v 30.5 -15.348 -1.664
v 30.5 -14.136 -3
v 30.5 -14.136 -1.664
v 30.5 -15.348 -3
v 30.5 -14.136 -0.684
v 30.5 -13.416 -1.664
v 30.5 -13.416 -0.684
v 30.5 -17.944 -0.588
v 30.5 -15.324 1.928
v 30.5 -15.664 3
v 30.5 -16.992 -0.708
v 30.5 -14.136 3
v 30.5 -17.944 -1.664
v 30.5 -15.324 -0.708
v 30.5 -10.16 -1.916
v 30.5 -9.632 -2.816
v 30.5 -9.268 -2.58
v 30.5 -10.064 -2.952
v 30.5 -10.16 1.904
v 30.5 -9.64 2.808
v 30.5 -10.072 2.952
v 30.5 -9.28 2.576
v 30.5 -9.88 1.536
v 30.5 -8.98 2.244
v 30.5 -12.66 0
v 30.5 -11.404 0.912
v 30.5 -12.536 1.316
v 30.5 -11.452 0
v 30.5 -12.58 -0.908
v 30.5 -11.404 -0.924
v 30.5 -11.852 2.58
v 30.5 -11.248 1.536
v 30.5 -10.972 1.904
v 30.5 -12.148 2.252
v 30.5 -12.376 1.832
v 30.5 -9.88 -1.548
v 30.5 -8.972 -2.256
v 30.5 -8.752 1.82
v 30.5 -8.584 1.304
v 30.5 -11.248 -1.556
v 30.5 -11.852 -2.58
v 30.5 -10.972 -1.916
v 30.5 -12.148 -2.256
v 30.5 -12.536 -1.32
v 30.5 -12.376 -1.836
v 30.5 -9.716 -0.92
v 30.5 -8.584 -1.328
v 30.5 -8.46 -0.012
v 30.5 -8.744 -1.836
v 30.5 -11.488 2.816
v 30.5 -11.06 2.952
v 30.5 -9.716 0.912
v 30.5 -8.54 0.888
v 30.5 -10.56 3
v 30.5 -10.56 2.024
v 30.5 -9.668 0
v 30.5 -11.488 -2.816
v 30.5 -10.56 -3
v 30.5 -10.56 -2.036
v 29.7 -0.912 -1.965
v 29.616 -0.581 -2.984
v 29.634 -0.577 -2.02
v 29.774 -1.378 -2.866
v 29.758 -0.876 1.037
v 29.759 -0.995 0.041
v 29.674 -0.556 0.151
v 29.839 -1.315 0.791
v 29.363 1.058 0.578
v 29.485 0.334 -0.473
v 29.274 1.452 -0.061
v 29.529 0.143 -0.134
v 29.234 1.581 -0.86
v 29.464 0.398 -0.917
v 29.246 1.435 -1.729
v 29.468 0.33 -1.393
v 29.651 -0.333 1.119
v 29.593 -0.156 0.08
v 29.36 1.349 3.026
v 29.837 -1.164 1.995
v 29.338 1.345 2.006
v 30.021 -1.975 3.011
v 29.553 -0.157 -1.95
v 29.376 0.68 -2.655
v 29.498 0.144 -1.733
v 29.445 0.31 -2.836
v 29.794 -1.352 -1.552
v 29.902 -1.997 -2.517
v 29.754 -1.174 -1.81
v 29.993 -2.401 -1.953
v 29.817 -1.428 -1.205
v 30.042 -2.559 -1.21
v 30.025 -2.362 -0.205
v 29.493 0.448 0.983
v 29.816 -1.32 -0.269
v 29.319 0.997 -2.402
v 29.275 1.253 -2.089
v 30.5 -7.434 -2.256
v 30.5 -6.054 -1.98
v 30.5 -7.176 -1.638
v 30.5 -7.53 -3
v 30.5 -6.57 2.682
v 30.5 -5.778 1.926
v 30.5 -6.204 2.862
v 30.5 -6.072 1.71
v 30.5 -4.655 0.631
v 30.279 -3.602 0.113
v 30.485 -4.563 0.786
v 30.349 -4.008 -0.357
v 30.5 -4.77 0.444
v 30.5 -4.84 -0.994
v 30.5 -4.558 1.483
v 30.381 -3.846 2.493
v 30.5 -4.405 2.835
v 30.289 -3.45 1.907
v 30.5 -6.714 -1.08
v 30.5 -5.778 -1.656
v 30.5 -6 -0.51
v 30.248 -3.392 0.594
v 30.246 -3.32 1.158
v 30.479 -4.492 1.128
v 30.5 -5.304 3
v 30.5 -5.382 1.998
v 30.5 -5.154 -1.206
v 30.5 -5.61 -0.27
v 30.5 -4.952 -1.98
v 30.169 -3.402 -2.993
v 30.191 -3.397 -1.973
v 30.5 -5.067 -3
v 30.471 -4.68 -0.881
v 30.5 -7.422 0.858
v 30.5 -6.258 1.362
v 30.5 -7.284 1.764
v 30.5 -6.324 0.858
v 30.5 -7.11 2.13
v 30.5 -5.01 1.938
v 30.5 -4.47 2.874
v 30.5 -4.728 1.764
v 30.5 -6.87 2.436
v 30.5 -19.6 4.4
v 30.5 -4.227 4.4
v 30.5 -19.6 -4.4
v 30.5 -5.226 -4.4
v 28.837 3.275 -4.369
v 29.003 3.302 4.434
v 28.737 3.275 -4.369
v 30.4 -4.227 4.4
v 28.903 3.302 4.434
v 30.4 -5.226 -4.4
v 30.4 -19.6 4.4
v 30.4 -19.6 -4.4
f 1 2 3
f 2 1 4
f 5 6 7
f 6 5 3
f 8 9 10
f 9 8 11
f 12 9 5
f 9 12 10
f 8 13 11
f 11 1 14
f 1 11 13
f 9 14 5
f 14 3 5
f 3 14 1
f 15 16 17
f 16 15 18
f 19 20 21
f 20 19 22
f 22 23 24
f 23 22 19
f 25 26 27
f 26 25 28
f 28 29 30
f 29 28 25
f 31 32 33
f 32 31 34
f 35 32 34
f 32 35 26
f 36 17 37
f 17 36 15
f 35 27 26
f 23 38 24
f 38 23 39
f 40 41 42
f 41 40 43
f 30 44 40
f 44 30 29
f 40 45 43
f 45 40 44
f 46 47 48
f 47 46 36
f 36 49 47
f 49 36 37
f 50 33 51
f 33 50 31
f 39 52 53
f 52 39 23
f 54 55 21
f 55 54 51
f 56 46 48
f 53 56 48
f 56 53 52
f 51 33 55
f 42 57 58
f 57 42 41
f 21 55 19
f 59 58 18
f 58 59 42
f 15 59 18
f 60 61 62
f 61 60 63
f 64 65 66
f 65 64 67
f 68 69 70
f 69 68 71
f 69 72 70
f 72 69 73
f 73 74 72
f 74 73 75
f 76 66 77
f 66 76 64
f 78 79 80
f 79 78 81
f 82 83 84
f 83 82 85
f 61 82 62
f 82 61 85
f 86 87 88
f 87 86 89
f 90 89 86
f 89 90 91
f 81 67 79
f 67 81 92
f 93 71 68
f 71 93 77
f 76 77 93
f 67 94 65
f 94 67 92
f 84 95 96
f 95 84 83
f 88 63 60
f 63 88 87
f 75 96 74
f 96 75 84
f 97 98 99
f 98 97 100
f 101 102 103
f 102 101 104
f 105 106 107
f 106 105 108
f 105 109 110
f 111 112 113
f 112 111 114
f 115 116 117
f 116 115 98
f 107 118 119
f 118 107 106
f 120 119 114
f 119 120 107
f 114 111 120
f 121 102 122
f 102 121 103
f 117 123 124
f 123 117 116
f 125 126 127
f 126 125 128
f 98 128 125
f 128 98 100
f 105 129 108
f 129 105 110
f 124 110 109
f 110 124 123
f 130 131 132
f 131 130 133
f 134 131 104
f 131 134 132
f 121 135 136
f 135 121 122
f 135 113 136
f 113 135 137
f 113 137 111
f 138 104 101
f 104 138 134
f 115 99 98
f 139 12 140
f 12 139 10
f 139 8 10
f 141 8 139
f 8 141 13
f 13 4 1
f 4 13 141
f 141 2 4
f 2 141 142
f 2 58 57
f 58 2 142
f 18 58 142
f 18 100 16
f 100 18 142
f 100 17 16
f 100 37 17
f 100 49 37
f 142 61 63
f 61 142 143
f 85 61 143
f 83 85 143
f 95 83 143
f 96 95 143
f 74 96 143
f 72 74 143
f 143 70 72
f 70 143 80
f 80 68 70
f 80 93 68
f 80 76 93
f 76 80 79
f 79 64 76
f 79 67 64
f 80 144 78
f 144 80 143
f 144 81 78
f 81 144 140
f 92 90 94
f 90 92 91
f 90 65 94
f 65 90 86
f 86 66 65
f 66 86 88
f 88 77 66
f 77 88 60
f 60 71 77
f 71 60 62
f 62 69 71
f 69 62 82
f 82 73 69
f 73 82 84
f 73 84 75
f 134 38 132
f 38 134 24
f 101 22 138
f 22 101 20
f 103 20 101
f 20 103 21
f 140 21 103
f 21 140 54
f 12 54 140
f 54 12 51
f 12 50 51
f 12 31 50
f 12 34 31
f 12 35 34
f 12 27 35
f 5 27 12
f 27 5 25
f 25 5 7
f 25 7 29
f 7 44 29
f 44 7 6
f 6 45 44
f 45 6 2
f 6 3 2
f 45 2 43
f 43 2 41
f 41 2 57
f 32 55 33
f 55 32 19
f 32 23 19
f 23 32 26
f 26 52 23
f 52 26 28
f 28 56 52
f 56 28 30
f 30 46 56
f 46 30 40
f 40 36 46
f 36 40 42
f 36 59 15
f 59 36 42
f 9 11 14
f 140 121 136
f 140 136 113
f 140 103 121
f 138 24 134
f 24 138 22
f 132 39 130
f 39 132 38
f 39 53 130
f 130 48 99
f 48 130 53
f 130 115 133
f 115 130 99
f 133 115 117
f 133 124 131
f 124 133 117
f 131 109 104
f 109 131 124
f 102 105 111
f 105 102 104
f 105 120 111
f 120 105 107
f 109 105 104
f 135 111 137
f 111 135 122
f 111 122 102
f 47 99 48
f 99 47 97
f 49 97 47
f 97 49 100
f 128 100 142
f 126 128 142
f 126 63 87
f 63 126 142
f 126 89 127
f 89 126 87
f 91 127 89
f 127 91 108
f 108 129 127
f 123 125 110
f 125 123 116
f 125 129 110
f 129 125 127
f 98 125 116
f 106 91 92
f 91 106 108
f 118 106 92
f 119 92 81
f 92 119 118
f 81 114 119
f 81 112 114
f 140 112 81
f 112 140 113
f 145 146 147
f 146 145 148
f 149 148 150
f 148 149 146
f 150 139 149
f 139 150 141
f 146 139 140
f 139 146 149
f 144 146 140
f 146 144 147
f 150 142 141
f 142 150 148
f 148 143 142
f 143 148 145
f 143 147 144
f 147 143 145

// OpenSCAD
use <../lib.scad>
function ldraw_lib__194305fc01() = [
// 0 Sticker  1.1 x  2.9 with White "4025" on Transparent Background (Formed for Boat Stern Left Side)
// 0 Name: 194305fc01.dat
// 0 Author: Takeshi Takahashi [RainbowDolphin]
// 0 !LDRAW_ORG Part UPDATE 2022-06
// 0 !LICENSE Licensed under CC BY 4.0 : see CAreadme.txt
// 
// 0 BFC CERTIFY CCW
  [0,"BFC","CERTIFY"],
  [0,"BFC","CCW"],
// 
// 0 !KEYWORDS Bricklink 4025stk01, Brickowl 866936, Fire boat, Rebrickable 194305
// 0 !KEYWORDS Set 4025
// 
// 0 !HISTORY 2022-12-20 [PTadmin] Official Update 2022-06
// 
// 
// 0 BFC NOCLIP
  [0,"BFC","NOCLIP"],
// 4 15 76.25 7.5 -38.37 76.25 7.5 -35.34 76.25 4.16 -35.34 76.25 4.16 -38.37
  [4,15,76.25,7.5,-38.37,76.25,7.5,-35.34,76.25,4.16,-35.34,76.25,4.16,-38.37],
// 4 15 76.25 1.71 -35.34 76.25 4.16 -35.34 76.25 4.16 -33.54 76.25 1.71 -33.54
  [4,15,76.25,1.71,-35.34,76.25,4.16,-35.34,76.25,4.16,-33.54,76.25,1.71,-33.54],
// 4 15 76.25 1.77 -42.48 76.25 -4.82 -38.31 76.25 -7.5 -39.16 76.25 1.47 -44.86
  [4,15,76.25,1.77,-42.48,76.25,-4.82,-38.31,76.25,-7.5,-39.16,76.25,1.47,-44.86],
// 4 15 76.25 -7.5 -35.34 76.25 -7.5 -39.16 76.25 -4.82 -38.31 76.25 1.71 -35.34
  [4,15,76.25,-7.5,-35.34,76.25,-7.5,-39.16,76.25,-4.82,-38.31,76.25,1.71,-35.34],
// 3 15 76.25 1.47 -44.86 76.25 4.16 -44.86 76.25 1.77 -42.48
  [3,15,76.25,1.47,-44.86,76.25,4.16,-44.86,76.25,1.77,-42.48],
// 4 15 76.25 1.77 -38.31 76.25 1.77 -42.48 76.25 4.16 -44.86 76.25 4.16 -38.37
  [4,15,76.25,1.77,-38.31,76.25,1.77,-42.48,76.25,4.16,-44.86,76.25,4.16,-38.37],
// 3 15 76.25 -4.82 -38.31 76.25 1.77 -38.31 76.25 1.71 -35.34
  [3,15,76.25,-4.82,-38.31,76.25,1.77,-38.31,76.25,1.71,-35.34],
// 4 15 76.25 4.16 -38.37 76.25 4.16 -35.34 76.25 1.71 -35.34 76.25 1.77 -38.31
  [4,15,76.25,4.16,-38.37,76.25,4.16,-35.34,76.25,1.71,-35.34,76.25,1.77,-38.31],
// 4 15 76.25 6.45 -23.17 76.25 4.79 -25.4 76.25 7.38 -25.16 76.25 7.04 -24.08
  [4,15,76.25,6.45,-23.17,76.25,4.79,-25.4,76.25,7.38,-25.16,76.25,7.04,-24.08],
// 4 15 76.25 -7.38 -25.18 76.25 -4.76 -25.4 76.25 -6.44 -23.2 76.25 -7.02 -24.1
  [4,15,76.25,-7.38,-25.18,76.25,-4.76,-25.4,76.25,-6.44,-23.2,76.25,-7.02,-24.1],
// 4 15 76.25 -5.61 -22.45 76.25 -6.44 -23.2 76.25 -4.76 -25.4 76.25 -3.84 -24.7
  [4,15,76.25,-5.61,-22.45,76.25,-6.44,-23.2,76.25,-4.76,-25.4,76.25,-3.84,-24.7],
// 4 15 76.25 -3.29 -31.34 76.25 0 -31.65 76.25 0 -28.63 76.25 -2.28 -28.51
  [4,15,76.25,-3.29,-31.34,76.25,0,-31.65,76.25,0,-28.63,76.25,-2.28,-28.51],
// 4 15 76.25 0 -31.65 76.25 2.27 -31.45 76.25 2.31 -28.51 76.25 0 -28.63
  [4,15,76.25,0,-31.65,76.25,2.27,-31.45,76.25,2.31,-28.51,76.25,0,-28.63],
// 4 15 76.25 -4.76 -27.43 76.25 -6.45 -29.63 76.25 -5.63 -30.37 76.25 -3.84 -28.119
  [4,15,76.25,-4.76,-27.43,76.25,-6.45,-29.63,76.25,-5.63,-30.37,76.25,-3.84,-28.119],
// 4 15 76.25 -3.84 -28.119 76.25 -5.63 -30.37 76.25 -4.58 -30.94 76.25 -2.28 -28.51
  [4,15,76.25,-3.84,-28.119,76.25,-5.63,-30.37,76.25,-4.58,-30.94,76.25,-2.28,-28.51],
// 4 15 76.25 4.79 -25.4 76.25 6.45 -23.17 76.25 5.64 -22.43 76.25 3.87 -24.7
  [4,15,76.25,4.79,-25.4,76.25,6.45,-23.17,76.25,5.64,-22.43,76.25,3.87,-24.7],
// 3 15 76.25 -4.58 -30.94 76.25 -3.29 -31.34 76.25 -2.28 -28.51
  [3,15,76.25,-4.58,-30.94,76.25,-3.29,-31.34,76.25,-2.28,-28.51],
// 4 15 76.25 -3.26 -21.46 76.25 -4.55 -21.88 76.25 -5.61 -22.45 76.25 -3.84 -24.7
  [4,15,76.25,-3.26,-21.46,76.25,-4.55,-21.88,76.25,-5.61,-22.45,76.25,-3.84,-24.7],
// 4 15 76.25 4.79 -27.43 76.25 3.89 -28.119 76.25 5.64 -30.37 76.25 6.45 -29.63
  [4,15,76.25,4.79,-27.43,76.25,3.89,-28.119,76.25,5.64,-30.37,76.25,6.45,-29.63],
// 4 15 76.25 2.27 -31.45 76.25 3.3 -31.34 76.25 3.89 -28.119 76.25 2.31 -28.51
  [4,15,76.25,2.27,-31.45,76.25,3.3,-31.34,76.25,3.89,-28.119,76.25,2.31,-28.51],
// 4 15 76.25 3.3 -31.34 76.25 4.59 -30.94 76.25 5.64 -30.37 76.25 3.89 -28.119
  [4,15,76.25,3.3,-31.34,76.25,4.59,-30.94,76.25,5.64,-30.37,76.25,3.89,-28.119],
// 4 15 76.25 .03 -21.15 76.25 2.3 -24.29 76.25 3.87 -24.7 76.25 3.32 -21.46
  [4,15,76.25,.03,-21.15,76.25,2.3,-24.29,76.25,3.87,-24.7,76.25,3.32,-21.46],
// 4 15 76.25 5.64 -22.43 76.25 4.59 -21.86 76.25 3.32 -21.46 76.25 3.87 -24.7
  [4,15,76.25,5.64,-22.43,76.25,4.59,-21.86,76.25,3.32,-21.46,76.25,3.87,-24.7],
// 4 15 76.25 -6.45 -29.63 76.25 -4.76 -27.43 76.25 -7.38 -27.65 76.25 -7.04 -28.72
  [4,15,76.25,-6.45,-29.63,76.25,-4.76,-27.43,76.25,-7.38,-27.65,76.25,-7.04,-28.72],
// 4 15 76.25 -3.84 -24.7 76.25 -2.28 -24.29 76.25 -2.22 -21.35 76.25 -3.26 -21.46
  [4,15,76.25,-3.84,-24.7,76.25,-2.28,-24.29,76.25,-2.22,-21.35,76.25,-3.26,-21.46],
// 4 15 76.25 -7.38 -25.18 76.25 -7.5 -26.4 76.25 -7.38 -27.65 76.25 -5.06 -26.4
  [4,15,76.25,-7.38,-25.18,76.25,-7.5,-26.4,76.25,-7.38,-27.65,76.25,-5.06,-26.4],
// 3 15 76.25 0 -24.17 76.25 2.3 -24.29 76.25 .03 -21.15
  [3,15,76.25,0,-24.17,76.25,2.3,-24.29,76.25,.03,-21.15],
// 4 15 76.25 -2.28 -24.29 76.25 0 -24.17 76.25 .03 -21.15 76.25 -2.22 -21.35
  [4,15,76.25,-2.28,-24.29,76.25,0,-24.17,76.25,.03,-21.15,76.25,-2.22,-21.35],
// 3 15 76.25 -7.38 -27.65 76.25 -4.76 -27.43 76.25 -5.06 -26.4
  [3,15,76.25,-7.38,-27.65,76.25,-4.76,-27.43,76.25,-5.06,-26.4],
// 4 15 76.25 6.45 -29.63 76.25 7.04 -28.72 76.25 7.5 -26.4 76.25 4.79 -27.43
  [4,15,76.25,6.45,-29.63,76.25,7.04,-28.72,76.25,7.5,-26.4,76.25,4.79,-27.43],
// 3 15 76.25 -7.38 -25.18 76.25 -5.06 -26.4 76.25 -4.76 -25.4
  [3,15,76.25,-7.38,-25.18,76.25,-5.06,-26.4,76.25,-4.76,-25.4],
// 4 15 76.25 4.79 -27.43 76.25 7.5 -26.4 76.25 7.38 -25.16 76.25 5.09 -26.4
  [4,15,76.25,4.79,-27.43,76.25,7.5,-26.4,76.25,7.38,-25.16,76.25,5.09,-26.4],
// 3 15 76.25 4.79 -25.4 76.25 5.09 -26.4 76.25 7.38 -25.16
  [3,15,76.25,4.79,-25.4,76.25,5.09,-26.4,76.25,7.38,-25.16],
// 4 15 74.4358 7.1662 -3.4444 74.041 7.4589 -1.4515 74.0842 5.0497 -1.4431 74.2504 4.9128 -2.2806
  [4,15,74.4358,7.1662,-3.4444,74.041,7.4589,-1.4515,74.0842,5.0497,-1.4431,74.2504,4.9128,-2.2806],
// 4 15 74.5986 -1.9773 -3.2884 74.3972 -.1018 -2.4885 74.1851 -.3766 -1.3906 74.3939 -2.5919 -2.1891
  [4,15,74.5986,-1.9773,-3.2884,74.3972,-.1018,-2.4885,74.1851,-.3766,-1.3906,74.3939,-2.5919,-2.1891],
// 4 15 73.8215 .3352 .3571 73.7114 1.1827 .8341 73.1842 .1529 3.6311 73.4068 -1.4442 2.6446
  [4,15,73.8215,.3352,.3571,73.7114,1.1827,.8341,73.1842,.1529,3.6311,73.4068,-1.4442,2.6446],
// 4 15 73.1842 .1529 3.6311 73.7114 1.1827 .8341 73.6595 2.2918 .994 73.0843 2.1511 3.9516
  [4,15,73.1842,.1529,3.6311,73.7114,1.1827,.8341,73.6595,2.2918,.994,73.0843,2.1511,3.9516],
// 4 15 73.6701 3.482 .826 73.115 4.3216 3.5876 73.0843 2.1511 3.9516 73.6595 2.2918 .994
  [4,15,73.6701,3.482,.826,73.115,4.3216,3.5876,73.0843,2.1511,3.9516,73.6595,2.2918,.994],
// 4 15 74.3939 -2.5919 -2.1891 74.1851 -.3766 -1.3906 73.9823 -.2012 -.391 74.1287 -2.7979 -.8319
  [4,15,74.3939,-2.5919,-2.1891,74.1851,-.3766,-1.3906,73.9823,-.2012,-.391,74.1287,-2.7979,-.8319],
// 4 15 75.0521 -7.5271 -4.9382 74.5913 -4.9875 -2.9099 73.3447 -5.0156 3.3622 73.4 -7.5644 3.3732
  [4,15,75.0521,-7.5271,-4.9382,74.5913,-4.9875,-2.9099,73.3447,-5.0156,3.3622,73.4,-7.5644,3.3732],
// 4 15 73.4404 6.6377 1.7012 73.7452 4.3334 .3607 73.8822 4.8759 -.3925 73.613 7.0909 .7749
  [4,15,73.4404,6.6377,1.7012,73.7452,4.3334,.3607,73.8822,4.8759,-.3925,73.613,7.0909,.7749],
// 4 15 74.0842 5.0497 -1.4431 74.041 7.4589 -1.4515 73.613 7.0909 .7749 73.8822 4.8759 -.3925
  [4,15,74.0842,5.0497,-1.4431,74.041,7.4589,-1.4515,73.613,7.0909,.7749,73.8822,4.8759,-.3925],
// 4 15 74.3853 4.5253 -2.9343 74.4848 3.8801 -3.381 74.9834 4.8814 -6.0019 74.7544 6.2922 -4.9922
  [4,15,74.3853,4.5253,-2.9343,74.4848,3.8801,-3.381,74.9834,4.8814,-6.0019,74.7544,6.2922,-4.9922],
// 4 15 75.1041 3.0241 -6.3979 74.9834 4.8814 -6.0019 74.4848 3.8801 -3.381 74.5419 3.0114 -3.5697
  [4,15,75.1041,3.0241,-6.3979,74.9834,4.8814,-6.0019,74.4848,3.8801,-3.381,74.5419,3.0114,-3.5697],
// 4 15 74.5913 -4.9875 -2.9099 75.0521 -7.5271 -4.9382 75.063 .5132 -5.9061 74.5986 -1.9773 -3.2884
  [4,15,74.5913,-4.9875,-2.9099,75.0521,-7.5271,-4.9382,75.063,.5132,-5.9061,74.5986,-1.9773,-3.2884],
// 4 15 73.4068 -1.4442 2.6446 73.7329 -2.4568 1.1194 73.9823 -.2012 -.391 73.8215 .3352 .3571
  [4,15,73.4068,-1.4442,2.6446,73.7329,-2.4568,1.1194,73.9823,-.2012,-.391,73.8215,.3352,.3571],
// 3 15 74.1287 -2.7979 -.8319 73.9823 -.2012 -.391 73.7329 -2.4568 1.1194
  [3,15,74.1287,-2.7979,-.8319,73.9823,-.2012,-.391,73.7329,-2.4568,1.1194],
// 4 15 75.063 .5132 -5.9061 74.5411 .6714 -3.2998 74.3972 -.1018 -2.4885 74.5986 -1.9773 -3.2884
  [4,15,75.063,.5132,-5.9061,74.5411,.6714,-3.2998,74.3972,-.1018,-2.4885,74.5986,-1.9773,-3.2884],
// 4 15 73.1873 5.223 3.1317 73.7452 4.3334 .3607 73.4404 6.6377 1.7012 73.2975 6.005 2.4932
  [4,15,73.1873,5.223,3.1317,73.7452,4.3334,.3607,73.4404,6.6377,1.7012,73.2975,6.005,2.4932],
// 4 15 74.7544 6.2922 -4.9922 74.4358 7.1662 -3.4444 74.2504 4.9128 -2.2806 74.3853 4.5253 -2.9343
  [4,15,74.7544,6.2922,-4.9922,74.4358,7.1662,-3.4444,74.2504,4.9128,-2.2806,74.3853,4.5253,-2.9343],
// 4 15 73.115 4.3216 3.5876 73.6701 3.482 .826 73.7452 4.3334 .3607 73.1873 5.223 3.1317
  [4,15,73.115,4.3216,3.5876,73.6701,3.482,.826,73.7452,4.3334,.3607,73.1873,5.223,3.1317],
// 4 15 76.25 4.095 -17.94 76.25 5.64 -18.585 76.25 7.5 -18.825 76.25 4.95 -15.135
  [4,15,76.25,4.095,-17.94,76.25,5.64,-18.585,76.25,7.5,-18.825,76.25,4.95,-15.135],
// 4 15 76.25 -7.155 -15.51 76.25 -6.705 -16.425 76.25 -4.275 -15.18 76.25 -4.815 -14.445
  [4,15,76.25,-7.155,-15.51,76.25,-6.705,-16.425,76.25,-4.275,-15.18,76.25,-4.815,-14.445],
// 4 15 76.213 -1.9658 -11.4074 76.25 -1.578 -11.6376 75.8726 .8915 -10.0201 75.6972 -.2825 -9.0049
  [4,15,76.213,-1.9658,-11.4074,76.25,-1.578,-11.6376,75.8726,.8915,-10.0201,75.6972,-.2825,-9.0049],
// 3 15 76.25 -1.578 -11.6376 76.25 -1.11 -11.925 76.25 2.4844 -12.0989
  [3,15,76.25,-1.578,-11.6376,76.25,-1.11,-11.925,76.25,2.4844,-12.0989],
// 4 15 75.9527 -6.2317 -9.6141 76.25 -7.0884 -11.0119 76.25 -3.7079 -11.3958 75.7229 -4.7669 -8.6248
  [4,15,75.9527,-6.2317,-9.6141,76.25,-7.0884,-11.0119,76.25,-3.7079,-11.3958,75.7229,-4.7669,-8.6248],
// 4 15 76.25 1.275 -15 76.25 2.7 -16.785 76.25 4.95 -15.135 76.25 4.14 -14.445
  [4,15,76.25,1.275,-15,76.25,2.7,-16.785,76.25,4.95,-15.135,76.25,4.14,-14.445],
// 4 15 76.213 -1.9658 -11.4074 75.6972 -.2825 -9.0049 75.62 -1.4842 -8.4803 75.6162 -2.8943 -8.301
  [4,15,76.213,-1.9658,-11.4074,75.6972,-.2825,-9.0049,75.62,-1.4842,-8.4803,75.6162,-2.8943,-8.301],
// 4 15 76.1971 -2.8212 -11.2305 76.213 -1.9658 -11.4074 75.6162 -2.8943 -8.301 75.7229 -4.7669 -8.6248
  [4,15,76.1971,-2.8212,-11.2305,76.213,-1.9658,-11.4074,75.6162,-2.8943,-8.301,75.7229,-4.7669,-8.6248],
// 3 15 75.7229 -4.7669 -8.6248 76.25 -3.7079 -11.3958 76.1971 -2.8212 -11.2305
  [3,15,75.7229,-4.7669,-8.6248,76.25,-3.7079,-11.3958,76.1971,-2.8212,-11.2305],
// 4 15 76.25 -4.995 -13.455 76.25 -7.5 -13.26 76.25 -7.155 -15.51 76.25 -4.815 -14.445
  [4,15,76.25,-4.995,-13.455,76.25,-7.5,-13.26,76.25,-7.155,-15.51,76.25,-4.815,-14.445],
// 4 15 76.25 .675 -14.025 76.25 1.275 -15 76.25 4.14 -14.445 76.25 3.015 -12.885
  [4,15,76.25,.675,-14.025,76.25,1.275,-15,76.25,4.14,-14.445,76.25,3.015,-12.885],
// 4 15 75.4224 7.4813 -8.5046 75.4777 4.9326 -8.4936 76.25 4.95 -12.3789 76.25 7.5 -12.6684
  [4,15,75.4224,7.4813,-8.5046,75.4777,4.9326,-8.4936,76.25,4.95,-12.3789,76.25,7.5,-12.6684],
// 4 15 76.25 4.95 -15.135 76.25 7.5 -18.825 76.25 7.5 -12.6684 76.25 4.95 -12.3789
  [4,15,76.25,4.95,-15.135,76.25,7.5,-18.825,76.25,7.5,-12.6684,76.25,4.95,-12.3789],
// 4 15 75.8726 .8915 -10.0201 76.25 -1.578 -11.6376 76.25 2.4844 -12.0989 76.1769 2.2033 -11.6995
  [4,15,75.8726,.8915,-10.0201,76.25,-1.578,-11.6376,76.25,2.4844,-12.0989,76.1769,2.2033,-11.6995],
// 4 15 76.25 -1.11 -11.925 76.25 .675 -14.025 76.25 3.015 -12.885 76.25 2.4844 -12.0989
  [4,15,76.25,-1.11,-11.925,76.25,.675,-14.025,76.25,3.015,-12.885,76.25,2.4844,-12.0989],
// 4 15 76.25 -4.41 -18.21 76.25 -2.145 -18.555 76.25 -2.145 -15.81 76.25 -3.405 -15.645
  [4,15,76.25,-4.41,-18.21,76.25,-2.145,-18.555,76.25,-2.145,-15.81,76.25,-3.405,-15.645],
// 4 15 76.25 -4.275 -15.18 76.25 -5.325 -17.775 76.25 -4.41 -18.21 76.25 -3.405 -15.645
  [4,15,76.25,-4.275,-15.18,76.25,-5.325,-17.775,76.25,-4.41,-18.21,76.25,-3.405,-15.645],
// 4 15 76.25 -4.995 -13.455 76.25 -4.845 -12.525 76.25 -7.185 -11.175 76.25 -7.5 -13.26
  [4,15,76.25,-4.995,-13.455,76.25,-4.845,-12.525,76.25,-7.185,-11.175,76.25,-7.5,-13.26],
// 4 15 76.25 -7.185 -11.175 76.25 -4.845 -12.525 76.25 -4.41 -11.82 76.25 -7.0884 -11.0119
  [4,15,76.25,-7.185,-11.175,76.25,-4.845,-12.525,76.25,-4.41,-11.82,76.25,-7.0884,-11.0119],
// 3 15 76.25 -7.0884 -11.0119 76.25 -4.41 -11.82 76.25 -3.7079 -11.3958
  [3,15,76.25,-7.0884,-11.0119,76.25,-4.41,-11.82,76.25,-3.7079,-11.3958],
// 4 15 76.25 -5.325 -17.775 76.25 -4.275 -15.18 76.25 -6.705 -16.425 76.25 -6.09 -17.175
  [4,15,76.25,-5.325,-17.775,76.25,-4.275,-15.18,76.25,-6.705,-16.425,76.25,-6.09,-17.175],
// 3 15 76.25 2.7 -16.785 76.25 4.095 -17.94 76.25 4.95 -15.135
  [3,15,76.25,2.7,-16.785,76.25,4.095,-17.94,76.25,4.95,-15.135],
// 0 BFC CLIP
  [0,"BFC","CLIP"],
// 4 16 76.25 -7.5 -35.34 76.25 -11 -10.5677 76.25 -11 -49 76.25 -7.5 -39.16
  [4,16,76.25,-7.5,-35.34,76.25,-11,-10.5677,76.25,-11,-49,76.25,-7.5,-39.16],
// 3 16 76.25 -11 -49 76.25 1.47 -44.86 76.25 -7.5 -39.16
  [3,16,76.25,-11,-49,76.25,1.47,-44.86,76.25,-7.5,-39.16],
// 4 16 76.25 1.47 -44.86 76.25 -11 -49 76.25 11 -49 76.25 4.16 -44.86
  [4,16,76.25,1.47,-44.86,76.25,-11,-49,76.25,11,-49,76.25,4.16,-44.86],
// 4 16 76.25 4.16 -38.37 76.25 4.16 -44.86 76.25 11 -49 76.25 7.5 -38.37
  [4,16,76.25,4.16,-38.37,76.25,4.16,-44.86,76.25,11,-49,76.25,7.5,-38.37],
// 4 16 76.25 7.5 -35.34 76.25 7.5 -38.37 76.25 11 -49 76.25 11 -13.0658
  [4,16,76.25,7.5,-35.34,76.25,7.5,-38.37,76.25,11,-49,76.25,11,-13.0658],
// 4 16 76.25 7.5 -35.34 76.25 11 -13.0658 76.25 7.5 -26.4 76.25 7.04 -28.72
  [4,16,76.25,7.5,-35.34,76.25,11,-13.0658,76.25,7.5,-26.4,76.25,7.04,-28.72],
// 3 16 76.25 7.38 -25.16 76.25 7.5 -26.4 76.25 11 -13.0658
  [3,16,76.25,7.38,-25.16,76.25,7.5,-26.4,76.25,11,-13.0658],
// 4 16 76.25 7.5 -18.825 76.25 7.04 -24.08 76.25 7.38 -25.16 76.25 11 -13.0658
  [4,16,76.25,7.5,-18.825,76.25,7.04,-24.08,76.25,7.38,-25.16,76.25,11,-13.0658],
// 3 16 76.25 7.5 -18.825 76.25 6.45 -23.17 76.25 7.04 -24.08
  [3,16,76.25,7.5,-18.825,76.25,6.45,-23.17,76.25,7.04,-24.08],
// 3 16 76.25 7.5 -18.825 76.25 5.64 -22.43 76.25 6.45 -23.17
  [3,16,76.25,7.5,-18.825,76.25,5.64,-22.43,76.25,6.45,-23.17],
// 3 16 76.25 7.5 -18.825 76.25 4.59 -21.86 76.25 5.64 -22.43
  [3,16,76.25,7.5,-18.825,76.25,4.59,-21.86,76.25,5.64,-22.43],
// 4 16 74.041 7.4589 -1.4515 74.4358 7.1662 -3.4444 76.25 11 -13.0658 72.0935 10.9226 8.188
  [4,16,74.041,7.4589,-1.4515,74.4358,7.1662,-3.4444,76.25,11,-13.0658,72.0935,10.9226,8.188],
// 3 16 73.613 7.0909 .7749 74.041 7.4589 -1.4515 72.0935 10.9226 8.188
  [3,16,73.613,7.0909,.7749,74.041,7.4589,-1.4515,72.0935,10.9226,8.188],
// 3 16 73.4404 6.6377 1.7012 73.613 7.0909 .7749 72.0935 10.9226 8.188
  [3,16,73.4404,6.6377,1.7012,73.613,7.0909,.7749,72.0935,10.9226,8.188],
// 3 16 73.2975 6.005 2.4932 73.4404 6.6377 1.7012 72.0935 10.9226 8.188
  [3,16,73.2975,6.005,2.4932,73.4404,6.6377,1.7012,72.0935,10.9226,8.188],
// 3 16 73.1873 5.223 3.1317 73.2975 6.005 2.4932 72.0935 10.9226 8.188
  [3,16,73.1873,5.223,3.1317,73.2975,6.005,2.4932,72.0935,10.9226,8.188],
// 3 16 73.115 4.3216 3.5876 73.1873 5.223 3.1317 72.0935 10.9226 8.188
  [3,16,73.115,4.3216,3.5876,73.1873,5.223,3.1317,72.0935,10.9226,8.188],
// 3 16 73.0843 2.1511 3.9516 73.115 4.3216 3.5876 72.0935 10.9226 8.188
  [3,16,73.0843,2.1511,3.9516,73.115,4.3216,3.5876,72.0935,10.9226,8.188],
// 4 16 73.1842 .1529 3.6311 73.0843 2.1511 3.9516 72.0935 10.9226 8.188 73.3447 -5.0156 3.3622
  [4,16,73.1842,.1529,3.6311,73.0843,2.1511,3.9516,72.0935,10.9226,8.188,73.3447,-5.0156,3.3622],
// 3 16 73.3447 -5.0156 3.3622 73.4068 -1.4442 2.6446 73.1842 .1529 3.6311
  [3,16,73.3447,-5.0156,3.3622,73.4068,-1.4442,2.6446,73.1842,.1529,3.6311],
// 3 16 73.3447 -5.0156 3.3622 73.7329 -2.4568 1.1194 73.4068 -1.4442 2.6446
  [3,16,73.3447,-5.0156,3.3622,73.7329,-2.4568,1.1194,73.4068,-1.4442,2.6446],
// 4 16 74.1287 -2.7979 -.8319 73.7329 -2.4568 1.1194 73.3447 -5.0156 3.3622 74.5913 -4.9875 -2.9099
  [4,16,74.1287,-2.7979,-.8319,73.7329,-2.4568,1.1194,73.3447,-5.0156,3.3622,74.5913,-4.9875,-2.9099],
// 3 16 74.5913 -4.9875 -2.9099 74.3939 -2.5919 -2.1891 74.1287 -2.7979 -.8319
  [3,16,74.5913,-4.9875,-2.9099,74.3939,-2.5919,-2.1891,74.1287,-2.7979,-.8319],
// 3 16 74.5913 -4.9875 -2.9099 74.5986 -1.9773 -3.2884 74.3939 -2.5919 -2.1891
  [3,16,74.5913,-4.9875,-2.9099,74.5986,-1.9773,-3.2884,74.3939,-2.5919,-2.1891],
// 4 16 73.3447 -5.0156 3.3622 72.0935 10.9226 8.188 72.5085 -11.0845 8.256 73.4 -7.5644 3.3732
  [4,16,73.3447,-5.0156,3.3622,72.0935,10.9226,8.188,72.5085,-11.0845,8.256,73.4,-7.5644,3.3732],
// 4 16 75.0521 -7.5271 -4.9382 73.4 -7.5644 3.3732 72.5085 -11.0845 8.256 76.25 -11 -10.5677
  [4,16,75.0521,-7.5271,-4.9382,73.4,-7.5644,3.3732,72.5085,-11.0845,8.256,76.25,-11,-10.5677],
// 4 16 74.5411 .6714 -3.2998 75.063 .5132 -5.9061 75.1041 3.0241 -6.3979 74.5419 3.0114 -3.5697
  [4,16,74.5411,.6714,-3.2998,75.063,.5132,-5.9061,75.1041,3.0241,-6.3979,74.5419,3.0114,-3.5697],
// 4 16 74.3972 -.1018 -2.4885 74.5411 .6714 -3.2998 74.5419 3.0114 -3.5697 74.4848 3.8801 -3.381
  [4,16,74.3972,-.1018,-2.4885,74.5411,.6714,-3.2998,74.5419,3.0114,-3.5697,74.4848,3.8801,-3.381],
// 4 16 74.1851 -.3766 -1.3906 74.3972 -.1018 -2.4885 74.4848 3.8801 -3.381 74.3853 4.5253 -2.9343
  [4,16,74.1851,-.3766,-1.3906,74.3972,-.1018,-2.4885,74.4848,3.8801,-3.381,74.3853,4.5253,-2.9343],
// 4 16 73.9823 -.2012 -.391 74.1851 -.3766 -1.3906 74.3853 4.5253 -2.9343 74.2504 4.9128 -2.2806
  [4,16,73.9823,-.2012,-.391,74.1851,-.3766,-1.3906,74.3853,4.5253,-2.9343,74.2504,4.9128,-2.2806],
// 4 16 73.8215 .3352 .3571 73.9823 -.2012 -.391 74.2504 4.9128 -2.2806 74.0842 5.0497 -1.4431
  [4,16,73.8215,.3352,.3571,73.9823,-.2012,-.391,74.2504,4.9128,-2.2806,74.0842,5.0497,-1.4431],
// 4 16 73.7114 1.1827 .8341 73.8215 .3352 .3571 74.0842 5.0497 -1.4431 73.8822 4.8759 -.3925
  [4,16,73.7114,1.1827,.8341,73.8215,.3352,.3571,74.0842,5.0497,-1.4431,73.8822,4.8759,-.3925],
// 4 16 73.6595 2.2918 .994 73.7114 1.1827 .8341 73.8822 4.8759 -.3925 73.7452 4.3334 .3607
  [4,16,73.6595,2.2918,.994,73.7114,1.1827,.8341,73.8822,4.8759,-.3925,73.7452,4.3334,.3607],
// 3 16 73.6595 2.2918 .994 73.7452 4.3334 .3607 73.6701 3.482 .826
  [3,16,73.6595,2.2918,.994,73.7452,4.3334,.3607,73.6701,3.482,.826],
// 4 16 76.25 -5.325 -17.775 76.25 -5.61 -22.45 76.25 -4.55 -21.88 76.25 -4.41 -18.21
  [4,16,76.25,-5.325,-17.775,76.25,-5.61,-22.45,76.25,-4.55,-21.88,76.25,-4.41,-18.21],
// 4 16 76.25 -6.705 -16.425 76.25 -7.02 -24.1 76.25 -6.44 -23.2 76.25 -6.09 -17.175
  [4,16,76.25,-6.705,-16.425,76.25,-7.02,-24.1,76.25,-6.44,-23.2,76.25,-6.09,-17.175],
// 4 16 76.25 -7.155 -15.51 76.25 -7.38 -25.18 76.25 -7.02 -24.1 76.25 -6.705 -16.425
  [4,16,76.25,-7.155,-15.51,76.25,-7.38,-25.18,76.25,-7.02,-24.1,76.25,-6.705,-16.425],
// 4 16 76.25 -7.155 -15.51 76.25 -11 -10.5677 76.25 -7.5 -26.4 76.25 -7.38 -25.18
  [4,16,76.25,-7.155,-15.51,76.25,-11,-10.5677,76.25,-7.5,-26.4,76.25,-7.38,-25.18],
// 4 16 76.25 -7.38 -27.65 76.25 -7.5 -26.4 76.25 -11 -10.5677 76.25 -7.5 -35.34
  [4,16,76.25,-7.38,-27.65,76.25,-7.5,-26.4,76.25,-11,-10.5677,76.25,-7.5,-35.34],
// 3 16 76.25 -7.5 -35.34 76.25 -7.04 -28.72 76.25 -7.38 -27.65
  [3,16,76.25,-7.5,-35.34,76.25,-7.04,-28.72,76.25,-7.38,-27.65],
// 3 16 76.25 -7.5 -35.34 76.25 -6.45 -29.63 76.25 -7.04 -28.72
  [3,16,76.25,-7.5,-35.34,76.25,-6.45,-29.63,76.25,-7.04,-28.72],
// 3 16 76.25 -7.5 -35.34 76.25 -5.63 -30.37 76.25 -6.45 -29.63
  [3,16,76.25,-7.5,-35.34,76.25,-5.63,-30.37,76.25,-6.45,-29.63],
// 3 16 76.25 -7.5 -35.34 76.25 -4.58 -30.94 76.25 -5.63 -30.37
  [3,16,76.25,-7.5,-35.34,76.25,-4.58,-30.94,76.25,-5.63,-30.37],
// 3 16 76.25 -7.5 -35.34 76.25 -3.29 -31.34 76.25 -4.58 -30.94
  [3,16,76.25,-7.5,-35.34,76.25,-3.29,-31.34,76.25,-4.58,-30.94],
// 4 16 76.25 0 -31.65 76.25 -3.29 -31.34 76.25 -7.5 -35.34 76.25 1.71 -35.34
  [4,16,76.25,0,-31.65,76.25,-3.29,-31.34,76.25,-7.5,-35.34,76.25,1.71,-35.34],
// 3 16 76.25 0 -31.65 76.25 1.71 -35.34 76.25 1.71 -33.54
  [3,16,76.25,0,-31.65,76.25,1.71,-35.34,76.25,1.71,-33.54],
// 3 16 76.25 0 -31.65 76.25 1.71 -33.54 76.25 2.27 -31.45
  [3,16,76.25,0,-31.65,76.25,1.71,-33.54,76.25,2.27,-31.45],
// 4 16 76.25 3.3 -31.34 76.25 2.27 -31.45 76.25 1.71 -33.54 76.25 4.16 -33.54
  [4,16,76.25,3.3,-31.34,76.25,2.27,-31.45,76.25,1.71,-33.54,76.25,4.16,-33.54],
// 4 16 76.25 4.59 -30.94 76.25 3.3 -31.34 76.25 4.16 -33.54 76.25 7.5 -35.34
  [4,16,76.25,4.59,-30.94,76.25,3.3,-31.34,76.25,4.16,-33.54,76.25,7.5,-35.34],
// 3 16 76.25 4.16 -33.54 76.25 4.16 -35.34 76.25 7.5 -35.34
  [3,16,76.25,4.16,-33.54,76.25,4.16,-35.34,76.25,7.5,-35.34],
// 3 16 76.25 4.59 -30.94 76.25 7.5 -35.34 76.25 5.64 -30.37
  [3,16,76.25,4.59,-30.94,76.25,7.5,-35.34,76.25,5.64,-30.37],
// 3 16 76.25 5.64 -30.37 76.25 7.5 -35.34 76.25 6.45 -29.63
  [3,16,76.25,5.64,-30.37,76.25,7.5,-35.34,76.25,6.45,-29.63],
// 3 16 76.25 6.45 -29.63 76.25 7.5 -35.34 76.25 7.04 -28.72
  [3,16,76.25,6.45,-29.63,76.25,7.5,-35.34,76.25,7.04,-28.72],
// 4 16 76.25 -4.76 -25.4 76.25 -5.06 -26.4 76.25 -4.76 -27.43 76.25 -3.84 -28.119
  [4,16,76.25,-4.76,-25.4,76.25,-5.06,-26.4,76.25,-4.76,-27.43,76.25,-3.84,-28.119],
// 4 16 76.25 -3.84 -24.7 76.25 -4.76 -25.4 76.25 -3.84 -28.119 76.25 -2.28 -28.51
  [4,16,76.25,-3.84,-24.7,76.25,-4.76,-25.4,76.25,-3.84,-28.119,76.25,-2.28,-28.51],
// 4 16 76.25 -2.28 -24.29 76.25 -3.84 -24.7 76.25 -2.28 -28.51 76.25 0 -28.63
  [4,16,76.25,-2.28,-24.29,76.25,-3.84,-24.7,76.25,-2.28,-28.51,76.25,0,-28.63],
// 4 16 76.25 0 -24.17 76.25 -2.28 -24.29 76.25 0 -28.63 76.25 2.31 -28.51
  [4,16,76.25,0,-24.17,76.25,-2.28,-24.29,76.25,0,-28.63,76.25,2.31,-28.51],
// 4 16 76.25 2.3 -24.29 76.25 0 -24.17 76.25 2.31 -28.51 76.25 3.89 -28.119
  [4,16,76.25,2.3,-24.29,76.25,0,-24.17,76.25,2.31,-28.51,76.25,3.89,-28.119],
// 4 16 76.25 3.87 -24.7 76.25 2.3 -24.29 76.25 3.89 -28.119 76.25 4.79 -27.43
  [4,16,76.25,3.87,-24.7,76.25,2.3,-24.29,76.25,3.89,-28.119,76.25,4.79,-27.43],
// 4 16 76.25 4.79 -25.4 76.25 3.87 -24.7 76.25 4.79 -27.43 76.25 5.09 -26.4
  [4,16,76.25,4.79,-25.4,76.25,3.87,-24.7,76.25,4.79,-27.43,76.25,5.09,-26.4],
// 3 16 76.25 -4.82 -38.31 76.25 1.77 -42.48 76.25 1.77 -38.31
  [3,16,76.25,-4.82,-38.31,76.25,1.77,-42.48,76.25,1.77,-38.31],
// 3 16 76.25 -11 -10.5677 76.25 -7.5 -13.26 76.25 -7.185 -11.175
  [3,16,76.25,-11,-10.5677,76.25,-7.5,-13.26,76.25,-7.185,-11.175],
// 3 16 76.25 -11 -10.5677 76.25 -7.185 -11.175 76.25 -7.0884 -11.0119
  [3,16,76.25,-11,-10.5677,76.25,-7.185,-11.175,76.25,-7.0884,-11.0119],
// 3 16 76.25 -11 -10.5677 76.25 -7.155 -15.51 76.25 -7.5 -13.26
  [3,16,76.25,-11,-10.5677,76.25,-7.155,-15.51,76.25,-7.5,-13.26],
// 4 16 76.25 -5.61 -22.45 76.25 -5.325 -17.775 76.25 -6.09 -17.175 76.25 -6.44 -23.2
  [4,16,76.25,-5.61,-22.45,76.25,-5.325,-17.775,76.25,-6.09,-17.175,76.25,-6.44,-23.2],
// 4 16 76.25 -4.41 -18.21 76.25 -4.55 -21.88 76.25 -3.26 -21.46 76.25 -2.145 -18.555
  [4,16,76.25,-4.41,-18.21,76.25,-4.55,-21.88,76.25,-3.26,-21.46,76.25,-2.145,-18.555],
// 3 16 76.25 -3.26 -21.46 76.25 -2.22 -21.35 76.25 -2.145 -18.555
  [3,16,76.25,-3.26,-21.46,76.25,-2.22,-21.35,76.25,-2.145,-18.555],
// 4 16 76.25 -2.145 -18.555 76.25 -2.22 -21.35 76.25 .03 -21.15 76.25 4.095 -17.94
  [4,16,76.25,-2.145,-18.555,76.25,-2.22,-21.35,76.25,.03,-21.15,76.25,4.095,-17.94],
// 4 16 76.25 -2.145 -18.555 76.25 4.095 -17.94 76.25 2.7 -16.785 76.25 -2.145 -15.81
  [4,16,76.25,-2.145,-18.555,76.25,4.095,-17.94,76.25,2.7,-16.785,76.25,-2.145,-15.81],
// 3 16 76.25 -2.145 -15.81 76.25 2.7 -16.785 76.25 1.275 -15
  [3,16,76.25,-2.145,-15.81,76.25,2.7,-16.785,76.25,1.275,-15],
// 4 16 76.25 -2.145 -15.81 76.25 1.275 -15 76.25 .675 -14.025 76.25 -3.405 -15.645
  [4,16,76.25,-2.145,-15.81,76.25,1.275,-15,76.25,.675,-14.025,76.25,-3.405,-15.645],
// 4 16 76.25 -3.405 -15.645 76.25 .675 -14.025 76.25 -1.11 -11.925 76.25 -4.275 -15.18
  [4,16,76.25,-3.405,-15.645,76.25,.675,-14.025,76.25,-1.11,-11.925,76.25,-4.275,-15.18],
// 4 16 76.25 -4.815 -14.445 76.25 -4.275 -15.18 76.25 -1.578 -11.6376 76.25 -3.7079 -11.3958
  [4,16,76.25,-4.815,-14.445,76.25,-4.275,-15.18,76.25,-1.578,-11.6376,76.25,-3.7079,-11.3958],
// 4 16 76.1971 -2.8212 -11.2305 76.25 -3.7079 -11.3958 76.25 -1.578 -11.6376 76.213 -1.9658 -11.4074
  [4,16,76.1971,-2.8212,-11.2305,76.25,-3.7079,-11.3958,76.25,-1.578,-11.6376,76.213,-1.9658,-11.4074],
// 3 16 76.25 -1.11 -11.925 76.25 -1.578 -11.6376 76.25 -4.275 -15.18
  [3,16,76.25,-1.11,-11.925,76.25,-1.578,-11.6376,76.25,-4.275,-15.18],
// 4 16 76.25 -4.41 -11.82 76.25 -4.845 -12.525 76.25 -4.995 -13.455 76.25 -3.7079 -11.3958
  [4,16,76.25,-4.41,-11.82,76.25,-4.845,-12.525,76.25,-4.995,-13.455,76.25,-3.7079,-11.3958],
// 3 16 76.25 -3.7079 -11.3958 76.25 -4.995 -13.455 76.25 -4.815 -14.445
  [3,16,76.25,-3.7079,-11.3958,76.25,-4.995,-13.455,76.25,-4.815,-14.445],
// 4 16 76.25 4.095 -17.94 76.25 .03 -21.15 76.25 3.32 -21.46 76.25 5.64 -18.585
  [4,16,76.25,4.095,-17.94,76.25,.03,-21.15,76.25,3.32,-21.46,76.25,5.64,-18.585],
// 4 16 76.25 4.59 -21.86 76.25 7.5 -18.825 76.25 5.64 -18.585 76.25 3.32 -21.46
  [4,16,76.25,4.59,-21.86,76.25,7.5,-18.825,76.25,5.64,-18.585,76.25,3.32,-21.46],
// 3 16 76.25 7.5 -12.6684 76.25 7.5 -18.825 76.25 11 -13.0658
  [3,16,76.25,7.5,-12.6684,76.25,7.5,-18.825,76.25,11,-13.0658],
// 3 16 75.4224 7.4813 -8.5046 76.25 7.5 -12.6684 76.25 11 -13.0658
  [3,16,75.4224,7.4813,-8.5046,76.25,7.5,-12.6684,76.25,11,-13.0658],
// 4 16 74.7544 6.2922 -4.9922 75.4224 7.4813 -8.5046 76.25 11 -13.0658 74.4358 7.1662 -3.4444
  [4,16,74.7544,6.2922,-4.9922,75.4224,7.4813,-8.5046,76.25,11,-13.0658,74.4358,7.1662,-3.4444],
// 4 16 75.4224 7.4813 -8.5046 74.7544 6.2922 -4.9922 74.9834 4.8814 -6.0019 75.4777 4.9326 -8.4936
  [4,16,75.4224,7.4813,-8.5046,74.7544,6.2922,-4.9922,74.9834,4.8814,-6.0019,75.4777,4.9326,-8.4936],
// 4 16 75.4777 4.9326 -8.4936 74.9834 4.8814 -6.0019 75.1041 3.0241 -6.3979 75.8726 .8915 -10.0201
  [4,16,75.4777,4.9326,-8.4936,74.9834,4.8814,-6.0019,75.1041,3.0241,-6.3979,75.8726,.8915,-10.0201],
// 3 16 75.8726 .8915 -10.0201 76.1769 2.2033 -11.6995 75.4777 4.9326 -8.4936
  [3,16,75.8726,.8915,-10.0201,76.1769,2.2033,-11.6995,75.4777,4.9326,-8.4936],
// 4 16 76.25 4.14 -14.445 76.25 4.95 -12.3789 76.25 2.4844 -12.0989 76.25 3.015 -12.885
  [4,16,76.25,4.14,-14.445,76.25,4.95,-12.3789,76.25,2.4844,-12.0989,76.25,3.015,-12.885],
// 4 16 76.25 4.95 -12.3789 75.4777 4.9326 -8.4936 76.1769 2.2033 -11.6995 76.25 2.4844 -12.0989
  [4,16,76.25,4.95,-12.3789,75.4777,4.9326,-8.4936,76.1769,2.2033,-11.6995,76.25,2.4844,-12.0989],
// 3 16 76.25 4.95 -15.135 76.25 4.95 -12.3789 76.25 4.14 -14.445
  [3,16,76.25,4.95,-15.135,76.25,4.95,-12.3789,76.25,4.14,-14.445],
// 4 16 75.8726 .8915 -10.0201 75.1041 3.0241 -6.3979 75.063 .5132 -5.9061 75.6972 -.2825 -9.0049
  [4,16,75.8726,.8915,-10.0201,75.1041,3.0241,-6.3979,75.063,.5132,-5.9061,75.6972,-.2825,-9.0049],
// 3 16 75.62 -1.4842 -8.4803 75.6972 -.2825 -9.0049 75.063 .5132 -5.9061
  [3,16,75.62,-1.4842,-8.4803,75.6972,-.2825,-9.0049,75.063,.5132,-5.9061],
// 4 16 75.6162 -2.8943 -8.301 75.62 -1.4842 -8.4803 75.063 .5132 -5.9061 75.0521 -7.5271 -4.9382
  [4,16,75.6162,-2.8943,-8.301,75.62,-1.4842,-8.4803,75.063,.5132,-5.9061,75.0521,-7.5271,-4.9382],
// 3 16 75.0521 -7.5271 -4.9382 75.7229 -4.7669 -8.6248 75.6162 -2.8943 -8.301
  [3,16,75.0521,-7.5271,-4.9382,75.7229,-4.7669,-8.6248,75.6162,-2.8943,-8.301],
// 3 16 75.0521 -7.5271 -4.9382 75.9527 -6.2317 -9.6141 75.7229 -4.7669 -8.6248
  [3,16,75.0521,-7.5271,-4.9382,75.9527,-6.2317,-9.6141,75.7229,-4.7669,-8.6248],
// 4 16 76.25 -11 -10.5677 76.25 -7.0884 -11.0119 75.9527 -6.2317 -9.6141 75.0521 -7.5271 -4.9382
  [4,16,76.25,-11,-10.5677,76.25,-7.0884,-11.0119,75.9527,-6.2317,-9.6141,75.0521,-7.5271,-4.9382],
// 4 16 71.8435 10.9226 8.188 76 11 -13.0658 76 -11 -10.5677 72.2585 -11.0845 8.256
  [4,16,71.8435,10.9226,8.188,76,11,-13.0658,76,-11,-10.5677,72.2585,-11.0845,8.256],
// 4 16 76 -11 -49 76 -11 -10.5677 76 11 -13.0658 76 11 -49
  [4,16,76,-11,-49,76,-11,-10.5677,76,11,-13.0658,76,11,-49],
// 4 16 76.25 11 -49 76.25 -11 -49 76 -11 -49 76 11 -49
  [4,16,76.25,11,-49,76.25,-11,-49,76,-11,-49,76,11,-49],
// 4 16 76 -11 -10.5677 76 -11 -49 76.25 -11 -49 76.25 -11 -10.5677
  [4,16,76,-11,-10.5677,76,-11,-49,76.25,-11,-49,76.25,-11,-10.5677],
// 4 16 72.2585 -11.0845 8.256 76 -11 -10.5677 76.25 -11 -10.5677 72.5085 -11.0845 8.256
  [4,16,72.2585,-11.0845,8.256,76,-11,-10.5677,76.25,-11,-10.5677,72.5085,-11.0845,8.256],
// 4 16 76.25 11 -49 76 11 -49 76 11 -13.0658 76.25 11 -13.0658
  [4,16,76.25,11,-49,76,11,-49,76,11,-13.0658,76.25,11,-13.0658],
// 4 16 76.25 11 -13.0658 76 11 -13.0658 71.8435 10.9226 8.188 72.0935 10.9226 8.188
  [4,16,76.25,11,-13.0658,76,11,-13.0658,71.8435,10.9226,8.188,72.0935,10.9226,8.188],
// 4 16 71.8435 10.9226 8.188 72.2585 -11.0845 8.256 72.5085 -11.0845 8.256 72.0935 10.9226 8.188
  [4,16,71.8435,10.9226,8.188,72.2585,-11.0845,8.256,72.5085,-11.0845,8.256,72.0935,10.9226,8.188],
// 5 24 76.25 11 -13.0658 76.25 -11 -10.5677 76.25 -11 -49 72.5085 -11.0845 8.256
  [5,24,76.25,11,-13.0658,76.25,-11,-10.5677,76.25,-11,-49,72.5085,-11.0845,8.256],
// 5 24 76 -11 -10.5677 76 11 -13.0658 71.8435 10.9226 8.188 76 11 -49
  [5,24,76,-11,-10.5677,76,11,-13.0658,71.8435,10.9226,8.188,76,11,-49],
];
module ldraw_lib__194305fc01(step=0, col=false, unit=2/5, alt=false, line=0.2, solid=!$preview)
    makepoly(ldraw_lib__194305fc01(), step=step, col=col, unit=unit, alt=alt, line=line, solid=solid);
ldraw_lib__194305fc01(line=0.2);
